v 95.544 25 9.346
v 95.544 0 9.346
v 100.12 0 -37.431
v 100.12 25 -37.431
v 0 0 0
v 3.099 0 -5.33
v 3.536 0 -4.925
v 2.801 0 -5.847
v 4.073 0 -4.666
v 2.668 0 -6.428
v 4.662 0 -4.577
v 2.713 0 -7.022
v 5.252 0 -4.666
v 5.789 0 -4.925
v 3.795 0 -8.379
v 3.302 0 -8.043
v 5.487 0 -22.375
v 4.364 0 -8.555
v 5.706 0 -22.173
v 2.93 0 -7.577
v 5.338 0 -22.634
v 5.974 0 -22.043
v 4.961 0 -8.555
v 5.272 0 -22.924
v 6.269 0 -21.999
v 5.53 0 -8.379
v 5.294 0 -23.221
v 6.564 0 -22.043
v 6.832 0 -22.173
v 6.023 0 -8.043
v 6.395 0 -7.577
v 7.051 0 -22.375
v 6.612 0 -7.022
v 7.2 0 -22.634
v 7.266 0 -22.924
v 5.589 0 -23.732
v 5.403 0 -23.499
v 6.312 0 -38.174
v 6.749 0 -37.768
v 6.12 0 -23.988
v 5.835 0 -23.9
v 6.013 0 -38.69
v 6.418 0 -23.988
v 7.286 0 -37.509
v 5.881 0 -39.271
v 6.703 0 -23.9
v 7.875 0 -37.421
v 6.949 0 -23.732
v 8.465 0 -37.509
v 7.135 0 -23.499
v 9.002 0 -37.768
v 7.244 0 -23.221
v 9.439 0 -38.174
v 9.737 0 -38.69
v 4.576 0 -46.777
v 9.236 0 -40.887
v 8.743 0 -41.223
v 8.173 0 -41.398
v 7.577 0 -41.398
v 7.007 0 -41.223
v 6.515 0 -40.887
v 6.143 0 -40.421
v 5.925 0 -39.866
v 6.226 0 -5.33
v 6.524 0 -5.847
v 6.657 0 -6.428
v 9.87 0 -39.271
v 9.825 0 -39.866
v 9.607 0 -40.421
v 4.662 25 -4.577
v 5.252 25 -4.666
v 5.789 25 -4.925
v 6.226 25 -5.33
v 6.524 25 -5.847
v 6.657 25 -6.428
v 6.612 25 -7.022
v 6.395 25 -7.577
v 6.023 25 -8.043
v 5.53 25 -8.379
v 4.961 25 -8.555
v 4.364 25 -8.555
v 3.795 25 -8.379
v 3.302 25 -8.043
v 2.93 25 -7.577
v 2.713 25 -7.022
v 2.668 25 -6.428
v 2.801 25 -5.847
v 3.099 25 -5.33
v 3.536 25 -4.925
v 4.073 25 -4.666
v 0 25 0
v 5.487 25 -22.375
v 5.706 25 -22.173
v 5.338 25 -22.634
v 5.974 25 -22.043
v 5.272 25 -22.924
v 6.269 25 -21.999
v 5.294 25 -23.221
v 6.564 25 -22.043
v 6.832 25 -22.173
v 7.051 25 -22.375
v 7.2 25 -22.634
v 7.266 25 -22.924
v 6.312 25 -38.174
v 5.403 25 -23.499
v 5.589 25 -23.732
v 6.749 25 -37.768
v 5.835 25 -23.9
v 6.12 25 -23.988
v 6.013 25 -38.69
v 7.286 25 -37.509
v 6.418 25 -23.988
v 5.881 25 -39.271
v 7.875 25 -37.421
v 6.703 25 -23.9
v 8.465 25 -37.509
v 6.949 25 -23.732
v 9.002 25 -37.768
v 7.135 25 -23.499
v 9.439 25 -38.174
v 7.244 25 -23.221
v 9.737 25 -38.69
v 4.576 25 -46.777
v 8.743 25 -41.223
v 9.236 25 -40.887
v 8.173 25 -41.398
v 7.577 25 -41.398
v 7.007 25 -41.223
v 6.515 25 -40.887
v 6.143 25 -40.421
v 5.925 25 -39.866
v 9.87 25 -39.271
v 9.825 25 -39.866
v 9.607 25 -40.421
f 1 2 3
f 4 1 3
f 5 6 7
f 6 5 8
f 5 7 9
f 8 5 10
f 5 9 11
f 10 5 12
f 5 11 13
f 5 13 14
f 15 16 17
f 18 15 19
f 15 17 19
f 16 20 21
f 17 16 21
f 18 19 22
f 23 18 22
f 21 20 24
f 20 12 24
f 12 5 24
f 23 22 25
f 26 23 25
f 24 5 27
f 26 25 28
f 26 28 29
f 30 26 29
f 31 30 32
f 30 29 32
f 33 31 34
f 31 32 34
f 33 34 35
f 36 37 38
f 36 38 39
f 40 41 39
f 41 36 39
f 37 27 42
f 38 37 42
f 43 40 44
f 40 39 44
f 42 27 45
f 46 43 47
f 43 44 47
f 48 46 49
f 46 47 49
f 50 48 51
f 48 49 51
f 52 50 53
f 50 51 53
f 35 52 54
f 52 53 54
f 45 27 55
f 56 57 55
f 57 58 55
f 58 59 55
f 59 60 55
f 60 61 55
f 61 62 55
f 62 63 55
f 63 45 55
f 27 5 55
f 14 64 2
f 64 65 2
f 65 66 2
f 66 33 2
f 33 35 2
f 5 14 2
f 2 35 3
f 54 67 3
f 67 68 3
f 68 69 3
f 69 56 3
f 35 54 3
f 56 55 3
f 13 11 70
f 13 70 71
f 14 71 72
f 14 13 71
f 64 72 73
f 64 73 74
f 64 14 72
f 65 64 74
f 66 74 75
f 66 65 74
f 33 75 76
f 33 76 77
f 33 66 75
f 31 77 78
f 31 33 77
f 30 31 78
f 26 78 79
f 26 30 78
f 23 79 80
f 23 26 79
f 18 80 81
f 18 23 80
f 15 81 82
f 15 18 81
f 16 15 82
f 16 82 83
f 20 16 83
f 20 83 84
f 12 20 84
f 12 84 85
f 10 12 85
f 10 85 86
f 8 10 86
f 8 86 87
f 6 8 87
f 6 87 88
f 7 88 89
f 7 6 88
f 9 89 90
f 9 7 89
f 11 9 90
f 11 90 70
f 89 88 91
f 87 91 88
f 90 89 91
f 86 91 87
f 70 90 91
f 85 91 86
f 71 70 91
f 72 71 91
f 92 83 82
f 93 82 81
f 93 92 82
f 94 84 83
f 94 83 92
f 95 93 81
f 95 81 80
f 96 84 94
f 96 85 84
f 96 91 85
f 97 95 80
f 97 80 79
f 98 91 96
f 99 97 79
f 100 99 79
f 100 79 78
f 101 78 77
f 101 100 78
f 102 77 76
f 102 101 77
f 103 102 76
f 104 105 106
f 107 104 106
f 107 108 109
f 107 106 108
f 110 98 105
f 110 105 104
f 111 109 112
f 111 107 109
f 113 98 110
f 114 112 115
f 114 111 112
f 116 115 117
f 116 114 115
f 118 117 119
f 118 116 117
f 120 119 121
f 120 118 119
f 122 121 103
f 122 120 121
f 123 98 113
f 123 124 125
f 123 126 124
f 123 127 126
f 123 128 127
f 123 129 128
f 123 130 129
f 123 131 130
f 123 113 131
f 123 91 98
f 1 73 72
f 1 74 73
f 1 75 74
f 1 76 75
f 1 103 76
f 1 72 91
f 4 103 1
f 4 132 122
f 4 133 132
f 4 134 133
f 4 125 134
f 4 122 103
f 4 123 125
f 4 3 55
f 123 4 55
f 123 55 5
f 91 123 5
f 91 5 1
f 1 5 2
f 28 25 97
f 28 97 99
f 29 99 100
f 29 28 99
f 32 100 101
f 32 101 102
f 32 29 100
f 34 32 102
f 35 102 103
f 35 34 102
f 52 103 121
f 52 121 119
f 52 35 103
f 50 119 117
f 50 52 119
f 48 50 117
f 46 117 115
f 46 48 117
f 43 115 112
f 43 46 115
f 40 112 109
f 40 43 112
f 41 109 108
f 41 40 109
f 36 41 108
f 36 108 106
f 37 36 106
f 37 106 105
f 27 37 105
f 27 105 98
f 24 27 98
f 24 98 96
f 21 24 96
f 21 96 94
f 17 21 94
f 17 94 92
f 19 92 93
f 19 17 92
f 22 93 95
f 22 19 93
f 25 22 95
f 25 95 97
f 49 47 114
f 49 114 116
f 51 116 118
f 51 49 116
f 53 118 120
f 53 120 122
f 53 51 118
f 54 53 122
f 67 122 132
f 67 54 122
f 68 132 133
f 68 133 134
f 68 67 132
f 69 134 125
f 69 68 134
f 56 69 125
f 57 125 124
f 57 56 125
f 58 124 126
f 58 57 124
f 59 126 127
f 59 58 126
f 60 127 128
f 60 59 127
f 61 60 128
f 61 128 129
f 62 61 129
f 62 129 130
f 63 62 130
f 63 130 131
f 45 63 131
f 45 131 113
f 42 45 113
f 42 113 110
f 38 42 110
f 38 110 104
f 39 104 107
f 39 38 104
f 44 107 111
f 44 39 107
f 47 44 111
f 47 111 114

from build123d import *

# Parameters (mm, degrees)
SKETCH_1_R      = 2
SKETCH_1_R_2    = 1
EXTRUDE_1_DEPTH = 25


with BuildPart() as part:
    # Эскиз1 → Бобышка-Вытянуть1 (new body)
    with BuildSketch(Plane(origin=(0, 0, 0), x_dir=(1, 0, 0), z_dir=(0, 1, 0))):
        Polygon((0, 0), (95.543981023, -9.345998627), (100.119626184, 37.430742082), (4.575645161, 46.776740709), align=None)
        with Locations(Location((4.662478276, 6.577332007, 0), (0, 0, 270))):
            Circle(SKETCH_1_R, mode=Mode.SUBTRACT)
        with Locations(Location((7.875165304, 39.420575483, 0), (0, 0, 270))):
            Circle(SKETCH_1_R, mode=Mode.SUBTRACT)
        with Locations(Location((6.26882179, 22.998953745, 0), (0, 0, 270))):
            Circle(SKETCH_1_R_2, mode=Mode.SUBTRACT)
    extrude(amount=EXTRUDE_1_DEPTH)


solid = part.part
